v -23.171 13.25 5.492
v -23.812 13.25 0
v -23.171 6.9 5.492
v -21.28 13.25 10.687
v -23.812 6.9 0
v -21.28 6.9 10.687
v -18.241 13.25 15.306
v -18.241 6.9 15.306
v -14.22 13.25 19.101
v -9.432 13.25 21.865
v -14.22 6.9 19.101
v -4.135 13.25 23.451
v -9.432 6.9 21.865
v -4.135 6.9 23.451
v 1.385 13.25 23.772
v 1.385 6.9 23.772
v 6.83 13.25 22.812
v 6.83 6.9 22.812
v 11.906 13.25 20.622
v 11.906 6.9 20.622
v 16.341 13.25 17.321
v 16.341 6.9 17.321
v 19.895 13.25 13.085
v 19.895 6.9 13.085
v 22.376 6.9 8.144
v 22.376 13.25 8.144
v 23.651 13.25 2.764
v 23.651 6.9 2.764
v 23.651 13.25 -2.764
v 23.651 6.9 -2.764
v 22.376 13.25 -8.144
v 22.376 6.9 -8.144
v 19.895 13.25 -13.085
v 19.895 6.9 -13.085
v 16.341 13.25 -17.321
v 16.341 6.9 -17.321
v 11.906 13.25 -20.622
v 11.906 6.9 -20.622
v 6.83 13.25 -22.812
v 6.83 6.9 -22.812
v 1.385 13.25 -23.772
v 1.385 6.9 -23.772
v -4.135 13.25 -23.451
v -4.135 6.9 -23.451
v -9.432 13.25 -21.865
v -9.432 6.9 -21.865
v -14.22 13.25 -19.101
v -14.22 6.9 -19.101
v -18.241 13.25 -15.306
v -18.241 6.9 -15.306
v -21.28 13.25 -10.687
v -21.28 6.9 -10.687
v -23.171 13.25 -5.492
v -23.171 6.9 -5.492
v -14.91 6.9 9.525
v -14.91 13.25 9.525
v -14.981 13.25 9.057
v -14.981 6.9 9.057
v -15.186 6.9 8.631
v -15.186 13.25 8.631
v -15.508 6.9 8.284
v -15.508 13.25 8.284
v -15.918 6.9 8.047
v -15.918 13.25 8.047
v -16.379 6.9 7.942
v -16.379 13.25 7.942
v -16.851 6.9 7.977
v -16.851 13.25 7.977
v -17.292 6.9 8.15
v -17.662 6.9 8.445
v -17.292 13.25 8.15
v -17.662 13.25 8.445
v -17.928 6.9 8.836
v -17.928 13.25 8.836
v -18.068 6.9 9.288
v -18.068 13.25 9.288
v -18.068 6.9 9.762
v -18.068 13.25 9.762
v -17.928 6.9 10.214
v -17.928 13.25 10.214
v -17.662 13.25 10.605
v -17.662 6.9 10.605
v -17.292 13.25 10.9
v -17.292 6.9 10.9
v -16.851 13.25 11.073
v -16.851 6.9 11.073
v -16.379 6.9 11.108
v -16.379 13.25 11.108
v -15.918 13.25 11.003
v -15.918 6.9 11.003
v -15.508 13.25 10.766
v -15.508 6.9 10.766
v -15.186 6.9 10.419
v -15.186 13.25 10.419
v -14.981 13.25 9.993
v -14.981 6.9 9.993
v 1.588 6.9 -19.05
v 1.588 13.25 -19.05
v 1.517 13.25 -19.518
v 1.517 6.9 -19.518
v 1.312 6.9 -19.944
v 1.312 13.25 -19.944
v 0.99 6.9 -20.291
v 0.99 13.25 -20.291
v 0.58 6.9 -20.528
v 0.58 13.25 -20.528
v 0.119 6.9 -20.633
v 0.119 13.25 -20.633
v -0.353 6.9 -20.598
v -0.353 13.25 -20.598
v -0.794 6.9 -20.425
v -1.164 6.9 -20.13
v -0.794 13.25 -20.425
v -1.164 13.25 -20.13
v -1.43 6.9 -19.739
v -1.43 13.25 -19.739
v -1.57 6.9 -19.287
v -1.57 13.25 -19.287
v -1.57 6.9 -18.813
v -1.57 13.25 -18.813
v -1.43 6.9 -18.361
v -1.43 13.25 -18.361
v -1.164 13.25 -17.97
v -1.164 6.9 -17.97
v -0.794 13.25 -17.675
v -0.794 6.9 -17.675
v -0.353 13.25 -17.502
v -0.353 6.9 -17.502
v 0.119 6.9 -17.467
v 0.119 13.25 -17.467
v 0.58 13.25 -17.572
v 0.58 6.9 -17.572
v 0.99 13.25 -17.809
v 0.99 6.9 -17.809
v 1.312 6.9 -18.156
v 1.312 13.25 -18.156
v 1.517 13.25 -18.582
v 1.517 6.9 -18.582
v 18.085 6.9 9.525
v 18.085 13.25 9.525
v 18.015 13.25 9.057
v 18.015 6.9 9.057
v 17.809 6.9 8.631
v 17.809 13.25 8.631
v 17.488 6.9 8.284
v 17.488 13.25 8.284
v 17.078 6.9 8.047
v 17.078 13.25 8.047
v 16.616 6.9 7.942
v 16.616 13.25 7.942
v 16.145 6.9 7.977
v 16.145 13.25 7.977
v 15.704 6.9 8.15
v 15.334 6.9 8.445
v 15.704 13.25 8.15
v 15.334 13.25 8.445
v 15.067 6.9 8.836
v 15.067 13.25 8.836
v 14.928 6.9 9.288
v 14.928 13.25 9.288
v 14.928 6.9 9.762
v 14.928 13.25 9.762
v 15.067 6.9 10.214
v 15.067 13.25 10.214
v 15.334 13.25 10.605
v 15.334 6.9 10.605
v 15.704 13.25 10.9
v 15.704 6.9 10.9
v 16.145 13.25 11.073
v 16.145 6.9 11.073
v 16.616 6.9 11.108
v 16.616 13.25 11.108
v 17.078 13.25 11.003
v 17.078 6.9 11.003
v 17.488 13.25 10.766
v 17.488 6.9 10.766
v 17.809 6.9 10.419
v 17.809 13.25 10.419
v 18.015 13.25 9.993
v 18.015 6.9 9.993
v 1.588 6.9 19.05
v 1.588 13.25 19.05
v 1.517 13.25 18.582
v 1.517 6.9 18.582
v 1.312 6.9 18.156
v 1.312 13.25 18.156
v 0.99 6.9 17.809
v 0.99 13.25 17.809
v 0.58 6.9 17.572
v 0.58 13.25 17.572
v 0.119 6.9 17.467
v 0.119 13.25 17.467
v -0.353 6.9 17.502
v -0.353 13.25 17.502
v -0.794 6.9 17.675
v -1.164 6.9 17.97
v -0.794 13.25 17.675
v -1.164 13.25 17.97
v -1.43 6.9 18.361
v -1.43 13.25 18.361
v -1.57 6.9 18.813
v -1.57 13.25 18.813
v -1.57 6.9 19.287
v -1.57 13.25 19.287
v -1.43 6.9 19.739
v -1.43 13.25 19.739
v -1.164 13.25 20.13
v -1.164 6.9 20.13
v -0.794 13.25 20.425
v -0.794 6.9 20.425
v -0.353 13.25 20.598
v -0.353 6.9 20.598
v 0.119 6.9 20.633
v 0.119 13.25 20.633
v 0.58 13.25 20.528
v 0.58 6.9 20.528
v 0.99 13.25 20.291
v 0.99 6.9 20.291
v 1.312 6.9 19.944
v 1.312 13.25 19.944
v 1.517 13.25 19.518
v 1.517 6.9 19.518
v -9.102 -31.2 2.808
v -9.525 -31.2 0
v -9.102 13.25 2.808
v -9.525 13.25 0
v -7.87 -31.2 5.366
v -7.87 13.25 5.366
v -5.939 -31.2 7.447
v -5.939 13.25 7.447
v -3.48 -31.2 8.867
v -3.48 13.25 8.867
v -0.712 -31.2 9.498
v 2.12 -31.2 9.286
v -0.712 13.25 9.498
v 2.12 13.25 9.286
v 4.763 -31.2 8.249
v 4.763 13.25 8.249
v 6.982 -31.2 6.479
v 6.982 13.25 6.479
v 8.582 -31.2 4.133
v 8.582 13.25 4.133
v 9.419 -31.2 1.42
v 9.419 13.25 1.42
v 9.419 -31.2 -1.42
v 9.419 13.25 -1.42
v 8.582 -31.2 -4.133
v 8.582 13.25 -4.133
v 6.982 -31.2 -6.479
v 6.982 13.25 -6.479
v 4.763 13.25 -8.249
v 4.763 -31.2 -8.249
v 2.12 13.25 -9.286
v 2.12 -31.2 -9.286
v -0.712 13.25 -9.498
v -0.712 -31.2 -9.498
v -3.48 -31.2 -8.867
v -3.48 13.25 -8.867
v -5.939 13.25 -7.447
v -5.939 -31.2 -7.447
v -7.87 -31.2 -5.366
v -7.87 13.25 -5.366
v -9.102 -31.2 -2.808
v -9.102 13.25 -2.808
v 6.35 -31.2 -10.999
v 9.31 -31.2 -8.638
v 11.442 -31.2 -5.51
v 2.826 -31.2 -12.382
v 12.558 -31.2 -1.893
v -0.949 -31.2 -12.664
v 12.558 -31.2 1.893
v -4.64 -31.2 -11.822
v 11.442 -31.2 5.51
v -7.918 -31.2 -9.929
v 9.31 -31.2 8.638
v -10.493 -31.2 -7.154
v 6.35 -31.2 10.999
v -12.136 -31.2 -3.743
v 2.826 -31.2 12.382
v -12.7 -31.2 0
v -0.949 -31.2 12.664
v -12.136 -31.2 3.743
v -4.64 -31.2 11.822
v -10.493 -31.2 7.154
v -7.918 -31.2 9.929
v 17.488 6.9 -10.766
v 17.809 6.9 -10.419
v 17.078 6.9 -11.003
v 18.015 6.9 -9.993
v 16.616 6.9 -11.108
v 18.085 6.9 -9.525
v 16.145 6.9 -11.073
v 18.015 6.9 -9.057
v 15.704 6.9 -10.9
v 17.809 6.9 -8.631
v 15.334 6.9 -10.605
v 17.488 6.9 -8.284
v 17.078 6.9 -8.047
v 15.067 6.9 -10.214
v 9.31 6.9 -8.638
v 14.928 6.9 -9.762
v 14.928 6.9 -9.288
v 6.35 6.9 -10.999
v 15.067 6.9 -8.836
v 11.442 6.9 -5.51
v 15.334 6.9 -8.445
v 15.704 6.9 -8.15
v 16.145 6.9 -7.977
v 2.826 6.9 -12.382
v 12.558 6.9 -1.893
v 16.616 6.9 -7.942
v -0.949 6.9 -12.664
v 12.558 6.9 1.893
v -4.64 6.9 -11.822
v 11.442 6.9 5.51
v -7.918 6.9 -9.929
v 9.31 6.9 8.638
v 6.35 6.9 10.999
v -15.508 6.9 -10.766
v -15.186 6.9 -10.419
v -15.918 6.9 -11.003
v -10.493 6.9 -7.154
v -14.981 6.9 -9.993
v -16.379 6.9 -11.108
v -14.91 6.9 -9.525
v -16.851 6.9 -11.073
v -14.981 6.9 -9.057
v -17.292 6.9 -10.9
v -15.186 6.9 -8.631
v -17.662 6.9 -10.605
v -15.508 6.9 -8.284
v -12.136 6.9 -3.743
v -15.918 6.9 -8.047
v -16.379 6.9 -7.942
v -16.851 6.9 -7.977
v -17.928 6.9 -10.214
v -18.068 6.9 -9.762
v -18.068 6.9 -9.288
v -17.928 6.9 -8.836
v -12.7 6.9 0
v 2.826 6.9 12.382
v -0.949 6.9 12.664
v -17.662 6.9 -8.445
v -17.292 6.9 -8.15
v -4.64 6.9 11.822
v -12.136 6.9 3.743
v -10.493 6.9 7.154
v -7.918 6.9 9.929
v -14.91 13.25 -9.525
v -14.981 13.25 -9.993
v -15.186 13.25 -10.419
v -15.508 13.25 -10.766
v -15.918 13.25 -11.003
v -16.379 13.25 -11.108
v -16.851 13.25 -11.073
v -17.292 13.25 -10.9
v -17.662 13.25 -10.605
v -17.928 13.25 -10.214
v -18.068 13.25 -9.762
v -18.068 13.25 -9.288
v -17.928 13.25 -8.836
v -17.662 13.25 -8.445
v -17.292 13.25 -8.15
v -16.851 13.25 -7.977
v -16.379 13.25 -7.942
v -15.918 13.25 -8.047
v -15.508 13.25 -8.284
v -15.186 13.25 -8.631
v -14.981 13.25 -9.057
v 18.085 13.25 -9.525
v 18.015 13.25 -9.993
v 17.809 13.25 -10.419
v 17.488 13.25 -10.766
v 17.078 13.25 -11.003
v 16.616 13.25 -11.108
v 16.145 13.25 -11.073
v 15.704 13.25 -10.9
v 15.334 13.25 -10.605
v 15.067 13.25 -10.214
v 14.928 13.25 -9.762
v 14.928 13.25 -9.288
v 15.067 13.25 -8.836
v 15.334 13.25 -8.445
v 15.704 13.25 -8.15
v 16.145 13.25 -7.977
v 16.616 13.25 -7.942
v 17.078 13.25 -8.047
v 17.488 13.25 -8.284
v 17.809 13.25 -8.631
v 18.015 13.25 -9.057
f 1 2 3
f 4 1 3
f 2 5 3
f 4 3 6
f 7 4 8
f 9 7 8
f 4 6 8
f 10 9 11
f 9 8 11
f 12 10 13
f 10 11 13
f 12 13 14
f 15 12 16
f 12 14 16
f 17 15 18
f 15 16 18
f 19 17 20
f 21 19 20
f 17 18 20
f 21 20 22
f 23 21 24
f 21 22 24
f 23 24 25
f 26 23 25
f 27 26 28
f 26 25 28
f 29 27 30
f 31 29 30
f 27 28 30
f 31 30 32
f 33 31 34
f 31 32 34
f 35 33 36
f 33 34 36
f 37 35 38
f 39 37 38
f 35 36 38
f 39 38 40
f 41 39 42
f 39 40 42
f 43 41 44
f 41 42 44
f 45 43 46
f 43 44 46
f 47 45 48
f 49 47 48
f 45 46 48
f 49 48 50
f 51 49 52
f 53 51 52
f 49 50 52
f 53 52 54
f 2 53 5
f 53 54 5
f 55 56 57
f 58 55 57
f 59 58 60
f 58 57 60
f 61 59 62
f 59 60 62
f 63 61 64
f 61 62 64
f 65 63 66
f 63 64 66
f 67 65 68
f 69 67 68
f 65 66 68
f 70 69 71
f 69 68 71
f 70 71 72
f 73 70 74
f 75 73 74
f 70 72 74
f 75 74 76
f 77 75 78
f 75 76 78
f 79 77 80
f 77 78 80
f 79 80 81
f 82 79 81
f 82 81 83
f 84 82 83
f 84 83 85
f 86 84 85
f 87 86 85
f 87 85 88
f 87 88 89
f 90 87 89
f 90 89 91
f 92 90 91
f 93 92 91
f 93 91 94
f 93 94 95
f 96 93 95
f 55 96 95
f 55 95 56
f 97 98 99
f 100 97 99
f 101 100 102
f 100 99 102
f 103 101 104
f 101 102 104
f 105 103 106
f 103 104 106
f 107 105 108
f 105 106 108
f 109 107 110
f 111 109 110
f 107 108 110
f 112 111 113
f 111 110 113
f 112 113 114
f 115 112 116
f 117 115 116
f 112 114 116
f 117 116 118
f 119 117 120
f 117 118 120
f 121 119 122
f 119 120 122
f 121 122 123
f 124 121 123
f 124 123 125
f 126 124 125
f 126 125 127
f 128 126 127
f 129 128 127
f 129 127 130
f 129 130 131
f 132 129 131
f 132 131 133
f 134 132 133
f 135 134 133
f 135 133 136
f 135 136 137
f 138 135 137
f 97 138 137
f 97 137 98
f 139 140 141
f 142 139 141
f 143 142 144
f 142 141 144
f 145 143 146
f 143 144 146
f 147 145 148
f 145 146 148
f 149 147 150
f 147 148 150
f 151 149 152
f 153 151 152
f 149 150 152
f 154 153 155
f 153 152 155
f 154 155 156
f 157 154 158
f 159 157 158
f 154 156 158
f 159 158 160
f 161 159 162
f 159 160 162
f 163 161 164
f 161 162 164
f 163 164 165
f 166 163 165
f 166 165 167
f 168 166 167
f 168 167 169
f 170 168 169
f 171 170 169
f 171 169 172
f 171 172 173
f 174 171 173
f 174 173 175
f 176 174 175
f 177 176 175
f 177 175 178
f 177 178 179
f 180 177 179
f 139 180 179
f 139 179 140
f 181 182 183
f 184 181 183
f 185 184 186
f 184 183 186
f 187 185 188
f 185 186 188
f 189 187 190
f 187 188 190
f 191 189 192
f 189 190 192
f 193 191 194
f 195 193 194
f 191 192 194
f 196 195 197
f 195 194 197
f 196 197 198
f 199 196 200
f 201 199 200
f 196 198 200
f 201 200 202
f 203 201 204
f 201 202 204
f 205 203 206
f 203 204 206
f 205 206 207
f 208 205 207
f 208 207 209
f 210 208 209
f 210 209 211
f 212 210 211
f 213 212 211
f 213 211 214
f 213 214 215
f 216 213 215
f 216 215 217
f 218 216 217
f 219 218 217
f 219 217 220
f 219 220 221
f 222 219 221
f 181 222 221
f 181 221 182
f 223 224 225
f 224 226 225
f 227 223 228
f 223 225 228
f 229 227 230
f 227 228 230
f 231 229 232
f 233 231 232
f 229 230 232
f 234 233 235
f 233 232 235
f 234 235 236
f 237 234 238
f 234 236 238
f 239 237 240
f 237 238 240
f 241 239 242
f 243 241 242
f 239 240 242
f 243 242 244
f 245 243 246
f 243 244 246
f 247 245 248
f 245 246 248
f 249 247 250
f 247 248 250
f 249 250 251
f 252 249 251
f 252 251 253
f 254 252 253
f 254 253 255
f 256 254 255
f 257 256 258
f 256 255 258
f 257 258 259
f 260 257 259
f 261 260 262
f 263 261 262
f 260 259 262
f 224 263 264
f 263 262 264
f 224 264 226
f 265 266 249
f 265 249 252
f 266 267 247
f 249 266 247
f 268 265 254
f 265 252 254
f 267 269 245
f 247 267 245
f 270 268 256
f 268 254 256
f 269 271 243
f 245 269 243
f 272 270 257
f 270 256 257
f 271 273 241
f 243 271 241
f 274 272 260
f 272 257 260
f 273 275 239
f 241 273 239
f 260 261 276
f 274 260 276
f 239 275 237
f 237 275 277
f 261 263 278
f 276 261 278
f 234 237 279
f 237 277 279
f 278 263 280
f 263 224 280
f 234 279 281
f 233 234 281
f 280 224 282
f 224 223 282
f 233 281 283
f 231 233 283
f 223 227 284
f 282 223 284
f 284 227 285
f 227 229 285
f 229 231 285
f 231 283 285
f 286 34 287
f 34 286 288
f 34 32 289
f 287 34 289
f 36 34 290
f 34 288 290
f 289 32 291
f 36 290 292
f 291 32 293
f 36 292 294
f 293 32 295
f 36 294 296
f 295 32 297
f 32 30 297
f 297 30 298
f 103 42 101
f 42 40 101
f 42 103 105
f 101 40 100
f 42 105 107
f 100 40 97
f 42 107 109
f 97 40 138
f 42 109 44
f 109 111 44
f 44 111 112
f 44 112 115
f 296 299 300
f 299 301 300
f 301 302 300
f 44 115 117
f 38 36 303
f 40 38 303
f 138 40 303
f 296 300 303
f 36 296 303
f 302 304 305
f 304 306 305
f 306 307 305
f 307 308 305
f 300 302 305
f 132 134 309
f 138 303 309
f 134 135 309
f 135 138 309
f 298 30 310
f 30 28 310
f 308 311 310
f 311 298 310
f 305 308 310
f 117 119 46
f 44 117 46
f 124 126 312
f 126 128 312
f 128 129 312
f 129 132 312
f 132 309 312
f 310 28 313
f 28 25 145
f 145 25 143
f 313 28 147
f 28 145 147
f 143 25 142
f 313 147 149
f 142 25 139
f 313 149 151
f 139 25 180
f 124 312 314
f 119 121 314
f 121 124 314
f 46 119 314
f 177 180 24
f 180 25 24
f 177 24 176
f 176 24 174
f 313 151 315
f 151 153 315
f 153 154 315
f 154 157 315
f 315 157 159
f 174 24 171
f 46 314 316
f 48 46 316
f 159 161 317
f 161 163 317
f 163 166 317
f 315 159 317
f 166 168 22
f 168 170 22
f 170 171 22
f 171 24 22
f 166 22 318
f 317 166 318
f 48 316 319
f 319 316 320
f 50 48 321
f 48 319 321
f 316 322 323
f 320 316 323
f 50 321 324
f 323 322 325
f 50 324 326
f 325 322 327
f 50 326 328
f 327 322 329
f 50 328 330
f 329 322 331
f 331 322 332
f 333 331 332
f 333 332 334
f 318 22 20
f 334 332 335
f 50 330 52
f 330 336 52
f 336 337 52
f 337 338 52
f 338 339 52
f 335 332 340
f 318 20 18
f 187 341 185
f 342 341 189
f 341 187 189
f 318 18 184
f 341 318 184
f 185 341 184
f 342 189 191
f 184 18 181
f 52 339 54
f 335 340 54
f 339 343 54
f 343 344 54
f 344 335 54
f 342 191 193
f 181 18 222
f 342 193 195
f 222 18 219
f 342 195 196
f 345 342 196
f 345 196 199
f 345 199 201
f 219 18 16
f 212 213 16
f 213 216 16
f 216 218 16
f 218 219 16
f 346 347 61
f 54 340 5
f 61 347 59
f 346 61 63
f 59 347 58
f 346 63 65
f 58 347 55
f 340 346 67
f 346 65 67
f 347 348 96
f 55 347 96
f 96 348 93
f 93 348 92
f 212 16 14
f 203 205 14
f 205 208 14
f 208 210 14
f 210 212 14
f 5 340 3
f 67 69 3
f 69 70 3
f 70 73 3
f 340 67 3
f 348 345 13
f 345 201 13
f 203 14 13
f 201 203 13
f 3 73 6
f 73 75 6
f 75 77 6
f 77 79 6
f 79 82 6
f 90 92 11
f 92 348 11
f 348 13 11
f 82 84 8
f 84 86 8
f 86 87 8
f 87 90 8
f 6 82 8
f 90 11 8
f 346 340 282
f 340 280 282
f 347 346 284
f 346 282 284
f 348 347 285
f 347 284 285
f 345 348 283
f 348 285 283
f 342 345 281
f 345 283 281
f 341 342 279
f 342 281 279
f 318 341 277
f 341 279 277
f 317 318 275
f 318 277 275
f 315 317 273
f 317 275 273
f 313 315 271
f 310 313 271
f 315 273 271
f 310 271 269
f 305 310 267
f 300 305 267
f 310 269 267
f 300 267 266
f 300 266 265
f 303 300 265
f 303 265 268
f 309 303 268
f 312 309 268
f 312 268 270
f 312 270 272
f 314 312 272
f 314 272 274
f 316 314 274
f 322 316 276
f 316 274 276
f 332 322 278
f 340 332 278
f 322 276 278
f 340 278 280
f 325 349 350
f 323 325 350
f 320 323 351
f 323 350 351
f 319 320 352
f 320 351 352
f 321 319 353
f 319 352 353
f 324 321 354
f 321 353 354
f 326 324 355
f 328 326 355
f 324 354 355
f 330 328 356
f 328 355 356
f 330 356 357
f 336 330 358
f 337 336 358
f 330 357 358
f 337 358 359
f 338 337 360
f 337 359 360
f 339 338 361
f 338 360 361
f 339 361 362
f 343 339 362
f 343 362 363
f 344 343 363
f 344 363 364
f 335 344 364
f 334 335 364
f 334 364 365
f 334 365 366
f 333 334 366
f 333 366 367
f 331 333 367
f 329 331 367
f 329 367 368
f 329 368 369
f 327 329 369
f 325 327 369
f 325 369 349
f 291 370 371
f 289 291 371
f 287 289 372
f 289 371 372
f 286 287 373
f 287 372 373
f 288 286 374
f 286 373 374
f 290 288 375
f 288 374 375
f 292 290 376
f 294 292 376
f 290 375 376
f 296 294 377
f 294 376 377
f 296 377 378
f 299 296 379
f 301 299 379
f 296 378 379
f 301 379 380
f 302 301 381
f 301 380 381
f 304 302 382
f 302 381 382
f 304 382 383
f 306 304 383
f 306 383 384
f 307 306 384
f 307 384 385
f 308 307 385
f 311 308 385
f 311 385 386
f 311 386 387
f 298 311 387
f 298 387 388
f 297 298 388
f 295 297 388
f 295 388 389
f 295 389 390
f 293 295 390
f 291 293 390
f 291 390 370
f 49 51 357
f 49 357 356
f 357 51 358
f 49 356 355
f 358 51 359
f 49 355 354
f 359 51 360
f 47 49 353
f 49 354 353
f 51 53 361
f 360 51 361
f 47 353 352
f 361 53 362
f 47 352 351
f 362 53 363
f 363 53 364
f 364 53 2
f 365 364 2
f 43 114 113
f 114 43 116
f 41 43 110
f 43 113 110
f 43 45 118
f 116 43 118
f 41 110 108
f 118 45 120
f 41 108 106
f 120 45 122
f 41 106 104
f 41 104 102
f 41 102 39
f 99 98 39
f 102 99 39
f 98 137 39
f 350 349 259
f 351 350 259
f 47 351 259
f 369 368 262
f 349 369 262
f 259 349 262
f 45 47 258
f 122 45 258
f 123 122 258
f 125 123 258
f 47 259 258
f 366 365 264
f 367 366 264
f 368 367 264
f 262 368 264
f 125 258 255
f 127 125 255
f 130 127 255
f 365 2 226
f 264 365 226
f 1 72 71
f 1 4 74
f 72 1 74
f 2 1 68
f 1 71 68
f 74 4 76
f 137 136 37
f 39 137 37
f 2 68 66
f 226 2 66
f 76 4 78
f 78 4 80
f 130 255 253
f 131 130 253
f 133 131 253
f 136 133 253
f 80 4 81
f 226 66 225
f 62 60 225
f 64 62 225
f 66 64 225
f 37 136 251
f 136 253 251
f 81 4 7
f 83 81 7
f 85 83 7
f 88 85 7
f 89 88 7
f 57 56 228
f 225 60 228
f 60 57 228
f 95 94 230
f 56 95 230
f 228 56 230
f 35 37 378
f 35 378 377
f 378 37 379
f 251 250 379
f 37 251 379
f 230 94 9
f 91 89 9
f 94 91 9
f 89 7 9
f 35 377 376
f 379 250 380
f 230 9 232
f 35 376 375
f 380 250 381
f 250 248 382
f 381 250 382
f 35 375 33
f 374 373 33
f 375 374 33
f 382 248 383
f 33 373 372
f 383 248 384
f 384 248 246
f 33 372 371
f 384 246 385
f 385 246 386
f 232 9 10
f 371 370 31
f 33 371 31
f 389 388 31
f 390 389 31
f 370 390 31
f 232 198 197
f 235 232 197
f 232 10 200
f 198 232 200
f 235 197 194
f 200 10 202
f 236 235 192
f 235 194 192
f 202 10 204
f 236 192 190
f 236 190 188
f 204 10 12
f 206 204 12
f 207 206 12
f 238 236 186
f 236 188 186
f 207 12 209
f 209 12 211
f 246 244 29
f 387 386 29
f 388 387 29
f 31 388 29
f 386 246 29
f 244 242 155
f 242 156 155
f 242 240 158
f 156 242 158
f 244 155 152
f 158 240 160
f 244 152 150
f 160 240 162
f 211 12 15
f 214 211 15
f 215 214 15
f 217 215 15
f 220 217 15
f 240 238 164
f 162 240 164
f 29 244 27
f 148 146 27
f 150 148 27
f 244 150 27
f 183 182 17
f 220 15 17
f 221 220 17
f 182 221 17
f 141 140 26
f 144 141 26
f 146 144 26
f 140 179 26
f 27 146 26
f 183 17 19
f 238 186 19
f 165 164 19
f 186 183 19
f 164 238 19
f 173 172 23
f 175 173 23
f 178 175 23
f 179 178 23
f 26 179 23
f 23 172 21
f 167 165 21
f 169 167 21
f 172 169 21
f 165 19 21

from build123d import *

# Parameters (mm, degrees)
F_1_8_0_125_DIAMETER_HOLE2_D = 3.175


with BuildPart() as part:
    # Sketch1 → Revolve1 (revolve)
    with BuildSketch(Plane.XY):
        Polygon((-9.525, -31.199666667), (-9.525, 13.250333333), (-23.8125, 13.250333333), (-23.8125, 6.900333333), (-12.7, 6.900333333), (-12.7, -31.199666667), align=None)
    revolve(axis=Axis((0, 0, 0), (0, 1, 0)))

    # 1/8 (0.125) Diameter Hole2 (through all)
    with Locations(Plane(origin=(0, 6.900333333, 0), x_dir=(-1, 0, 0), z_dir=(0, -1, 0))):
        with Locations((0, 19.05), (16.497783942, 9.525), (16.497783942, -9.525), (0, -19.05), (-16.497783942, -9.525), (-16.497783942, 9.525), (0, 0)):
            Hole(F_1_8_0_125_DIAMETER_HOLE2_D / 2)


solid = part.part
